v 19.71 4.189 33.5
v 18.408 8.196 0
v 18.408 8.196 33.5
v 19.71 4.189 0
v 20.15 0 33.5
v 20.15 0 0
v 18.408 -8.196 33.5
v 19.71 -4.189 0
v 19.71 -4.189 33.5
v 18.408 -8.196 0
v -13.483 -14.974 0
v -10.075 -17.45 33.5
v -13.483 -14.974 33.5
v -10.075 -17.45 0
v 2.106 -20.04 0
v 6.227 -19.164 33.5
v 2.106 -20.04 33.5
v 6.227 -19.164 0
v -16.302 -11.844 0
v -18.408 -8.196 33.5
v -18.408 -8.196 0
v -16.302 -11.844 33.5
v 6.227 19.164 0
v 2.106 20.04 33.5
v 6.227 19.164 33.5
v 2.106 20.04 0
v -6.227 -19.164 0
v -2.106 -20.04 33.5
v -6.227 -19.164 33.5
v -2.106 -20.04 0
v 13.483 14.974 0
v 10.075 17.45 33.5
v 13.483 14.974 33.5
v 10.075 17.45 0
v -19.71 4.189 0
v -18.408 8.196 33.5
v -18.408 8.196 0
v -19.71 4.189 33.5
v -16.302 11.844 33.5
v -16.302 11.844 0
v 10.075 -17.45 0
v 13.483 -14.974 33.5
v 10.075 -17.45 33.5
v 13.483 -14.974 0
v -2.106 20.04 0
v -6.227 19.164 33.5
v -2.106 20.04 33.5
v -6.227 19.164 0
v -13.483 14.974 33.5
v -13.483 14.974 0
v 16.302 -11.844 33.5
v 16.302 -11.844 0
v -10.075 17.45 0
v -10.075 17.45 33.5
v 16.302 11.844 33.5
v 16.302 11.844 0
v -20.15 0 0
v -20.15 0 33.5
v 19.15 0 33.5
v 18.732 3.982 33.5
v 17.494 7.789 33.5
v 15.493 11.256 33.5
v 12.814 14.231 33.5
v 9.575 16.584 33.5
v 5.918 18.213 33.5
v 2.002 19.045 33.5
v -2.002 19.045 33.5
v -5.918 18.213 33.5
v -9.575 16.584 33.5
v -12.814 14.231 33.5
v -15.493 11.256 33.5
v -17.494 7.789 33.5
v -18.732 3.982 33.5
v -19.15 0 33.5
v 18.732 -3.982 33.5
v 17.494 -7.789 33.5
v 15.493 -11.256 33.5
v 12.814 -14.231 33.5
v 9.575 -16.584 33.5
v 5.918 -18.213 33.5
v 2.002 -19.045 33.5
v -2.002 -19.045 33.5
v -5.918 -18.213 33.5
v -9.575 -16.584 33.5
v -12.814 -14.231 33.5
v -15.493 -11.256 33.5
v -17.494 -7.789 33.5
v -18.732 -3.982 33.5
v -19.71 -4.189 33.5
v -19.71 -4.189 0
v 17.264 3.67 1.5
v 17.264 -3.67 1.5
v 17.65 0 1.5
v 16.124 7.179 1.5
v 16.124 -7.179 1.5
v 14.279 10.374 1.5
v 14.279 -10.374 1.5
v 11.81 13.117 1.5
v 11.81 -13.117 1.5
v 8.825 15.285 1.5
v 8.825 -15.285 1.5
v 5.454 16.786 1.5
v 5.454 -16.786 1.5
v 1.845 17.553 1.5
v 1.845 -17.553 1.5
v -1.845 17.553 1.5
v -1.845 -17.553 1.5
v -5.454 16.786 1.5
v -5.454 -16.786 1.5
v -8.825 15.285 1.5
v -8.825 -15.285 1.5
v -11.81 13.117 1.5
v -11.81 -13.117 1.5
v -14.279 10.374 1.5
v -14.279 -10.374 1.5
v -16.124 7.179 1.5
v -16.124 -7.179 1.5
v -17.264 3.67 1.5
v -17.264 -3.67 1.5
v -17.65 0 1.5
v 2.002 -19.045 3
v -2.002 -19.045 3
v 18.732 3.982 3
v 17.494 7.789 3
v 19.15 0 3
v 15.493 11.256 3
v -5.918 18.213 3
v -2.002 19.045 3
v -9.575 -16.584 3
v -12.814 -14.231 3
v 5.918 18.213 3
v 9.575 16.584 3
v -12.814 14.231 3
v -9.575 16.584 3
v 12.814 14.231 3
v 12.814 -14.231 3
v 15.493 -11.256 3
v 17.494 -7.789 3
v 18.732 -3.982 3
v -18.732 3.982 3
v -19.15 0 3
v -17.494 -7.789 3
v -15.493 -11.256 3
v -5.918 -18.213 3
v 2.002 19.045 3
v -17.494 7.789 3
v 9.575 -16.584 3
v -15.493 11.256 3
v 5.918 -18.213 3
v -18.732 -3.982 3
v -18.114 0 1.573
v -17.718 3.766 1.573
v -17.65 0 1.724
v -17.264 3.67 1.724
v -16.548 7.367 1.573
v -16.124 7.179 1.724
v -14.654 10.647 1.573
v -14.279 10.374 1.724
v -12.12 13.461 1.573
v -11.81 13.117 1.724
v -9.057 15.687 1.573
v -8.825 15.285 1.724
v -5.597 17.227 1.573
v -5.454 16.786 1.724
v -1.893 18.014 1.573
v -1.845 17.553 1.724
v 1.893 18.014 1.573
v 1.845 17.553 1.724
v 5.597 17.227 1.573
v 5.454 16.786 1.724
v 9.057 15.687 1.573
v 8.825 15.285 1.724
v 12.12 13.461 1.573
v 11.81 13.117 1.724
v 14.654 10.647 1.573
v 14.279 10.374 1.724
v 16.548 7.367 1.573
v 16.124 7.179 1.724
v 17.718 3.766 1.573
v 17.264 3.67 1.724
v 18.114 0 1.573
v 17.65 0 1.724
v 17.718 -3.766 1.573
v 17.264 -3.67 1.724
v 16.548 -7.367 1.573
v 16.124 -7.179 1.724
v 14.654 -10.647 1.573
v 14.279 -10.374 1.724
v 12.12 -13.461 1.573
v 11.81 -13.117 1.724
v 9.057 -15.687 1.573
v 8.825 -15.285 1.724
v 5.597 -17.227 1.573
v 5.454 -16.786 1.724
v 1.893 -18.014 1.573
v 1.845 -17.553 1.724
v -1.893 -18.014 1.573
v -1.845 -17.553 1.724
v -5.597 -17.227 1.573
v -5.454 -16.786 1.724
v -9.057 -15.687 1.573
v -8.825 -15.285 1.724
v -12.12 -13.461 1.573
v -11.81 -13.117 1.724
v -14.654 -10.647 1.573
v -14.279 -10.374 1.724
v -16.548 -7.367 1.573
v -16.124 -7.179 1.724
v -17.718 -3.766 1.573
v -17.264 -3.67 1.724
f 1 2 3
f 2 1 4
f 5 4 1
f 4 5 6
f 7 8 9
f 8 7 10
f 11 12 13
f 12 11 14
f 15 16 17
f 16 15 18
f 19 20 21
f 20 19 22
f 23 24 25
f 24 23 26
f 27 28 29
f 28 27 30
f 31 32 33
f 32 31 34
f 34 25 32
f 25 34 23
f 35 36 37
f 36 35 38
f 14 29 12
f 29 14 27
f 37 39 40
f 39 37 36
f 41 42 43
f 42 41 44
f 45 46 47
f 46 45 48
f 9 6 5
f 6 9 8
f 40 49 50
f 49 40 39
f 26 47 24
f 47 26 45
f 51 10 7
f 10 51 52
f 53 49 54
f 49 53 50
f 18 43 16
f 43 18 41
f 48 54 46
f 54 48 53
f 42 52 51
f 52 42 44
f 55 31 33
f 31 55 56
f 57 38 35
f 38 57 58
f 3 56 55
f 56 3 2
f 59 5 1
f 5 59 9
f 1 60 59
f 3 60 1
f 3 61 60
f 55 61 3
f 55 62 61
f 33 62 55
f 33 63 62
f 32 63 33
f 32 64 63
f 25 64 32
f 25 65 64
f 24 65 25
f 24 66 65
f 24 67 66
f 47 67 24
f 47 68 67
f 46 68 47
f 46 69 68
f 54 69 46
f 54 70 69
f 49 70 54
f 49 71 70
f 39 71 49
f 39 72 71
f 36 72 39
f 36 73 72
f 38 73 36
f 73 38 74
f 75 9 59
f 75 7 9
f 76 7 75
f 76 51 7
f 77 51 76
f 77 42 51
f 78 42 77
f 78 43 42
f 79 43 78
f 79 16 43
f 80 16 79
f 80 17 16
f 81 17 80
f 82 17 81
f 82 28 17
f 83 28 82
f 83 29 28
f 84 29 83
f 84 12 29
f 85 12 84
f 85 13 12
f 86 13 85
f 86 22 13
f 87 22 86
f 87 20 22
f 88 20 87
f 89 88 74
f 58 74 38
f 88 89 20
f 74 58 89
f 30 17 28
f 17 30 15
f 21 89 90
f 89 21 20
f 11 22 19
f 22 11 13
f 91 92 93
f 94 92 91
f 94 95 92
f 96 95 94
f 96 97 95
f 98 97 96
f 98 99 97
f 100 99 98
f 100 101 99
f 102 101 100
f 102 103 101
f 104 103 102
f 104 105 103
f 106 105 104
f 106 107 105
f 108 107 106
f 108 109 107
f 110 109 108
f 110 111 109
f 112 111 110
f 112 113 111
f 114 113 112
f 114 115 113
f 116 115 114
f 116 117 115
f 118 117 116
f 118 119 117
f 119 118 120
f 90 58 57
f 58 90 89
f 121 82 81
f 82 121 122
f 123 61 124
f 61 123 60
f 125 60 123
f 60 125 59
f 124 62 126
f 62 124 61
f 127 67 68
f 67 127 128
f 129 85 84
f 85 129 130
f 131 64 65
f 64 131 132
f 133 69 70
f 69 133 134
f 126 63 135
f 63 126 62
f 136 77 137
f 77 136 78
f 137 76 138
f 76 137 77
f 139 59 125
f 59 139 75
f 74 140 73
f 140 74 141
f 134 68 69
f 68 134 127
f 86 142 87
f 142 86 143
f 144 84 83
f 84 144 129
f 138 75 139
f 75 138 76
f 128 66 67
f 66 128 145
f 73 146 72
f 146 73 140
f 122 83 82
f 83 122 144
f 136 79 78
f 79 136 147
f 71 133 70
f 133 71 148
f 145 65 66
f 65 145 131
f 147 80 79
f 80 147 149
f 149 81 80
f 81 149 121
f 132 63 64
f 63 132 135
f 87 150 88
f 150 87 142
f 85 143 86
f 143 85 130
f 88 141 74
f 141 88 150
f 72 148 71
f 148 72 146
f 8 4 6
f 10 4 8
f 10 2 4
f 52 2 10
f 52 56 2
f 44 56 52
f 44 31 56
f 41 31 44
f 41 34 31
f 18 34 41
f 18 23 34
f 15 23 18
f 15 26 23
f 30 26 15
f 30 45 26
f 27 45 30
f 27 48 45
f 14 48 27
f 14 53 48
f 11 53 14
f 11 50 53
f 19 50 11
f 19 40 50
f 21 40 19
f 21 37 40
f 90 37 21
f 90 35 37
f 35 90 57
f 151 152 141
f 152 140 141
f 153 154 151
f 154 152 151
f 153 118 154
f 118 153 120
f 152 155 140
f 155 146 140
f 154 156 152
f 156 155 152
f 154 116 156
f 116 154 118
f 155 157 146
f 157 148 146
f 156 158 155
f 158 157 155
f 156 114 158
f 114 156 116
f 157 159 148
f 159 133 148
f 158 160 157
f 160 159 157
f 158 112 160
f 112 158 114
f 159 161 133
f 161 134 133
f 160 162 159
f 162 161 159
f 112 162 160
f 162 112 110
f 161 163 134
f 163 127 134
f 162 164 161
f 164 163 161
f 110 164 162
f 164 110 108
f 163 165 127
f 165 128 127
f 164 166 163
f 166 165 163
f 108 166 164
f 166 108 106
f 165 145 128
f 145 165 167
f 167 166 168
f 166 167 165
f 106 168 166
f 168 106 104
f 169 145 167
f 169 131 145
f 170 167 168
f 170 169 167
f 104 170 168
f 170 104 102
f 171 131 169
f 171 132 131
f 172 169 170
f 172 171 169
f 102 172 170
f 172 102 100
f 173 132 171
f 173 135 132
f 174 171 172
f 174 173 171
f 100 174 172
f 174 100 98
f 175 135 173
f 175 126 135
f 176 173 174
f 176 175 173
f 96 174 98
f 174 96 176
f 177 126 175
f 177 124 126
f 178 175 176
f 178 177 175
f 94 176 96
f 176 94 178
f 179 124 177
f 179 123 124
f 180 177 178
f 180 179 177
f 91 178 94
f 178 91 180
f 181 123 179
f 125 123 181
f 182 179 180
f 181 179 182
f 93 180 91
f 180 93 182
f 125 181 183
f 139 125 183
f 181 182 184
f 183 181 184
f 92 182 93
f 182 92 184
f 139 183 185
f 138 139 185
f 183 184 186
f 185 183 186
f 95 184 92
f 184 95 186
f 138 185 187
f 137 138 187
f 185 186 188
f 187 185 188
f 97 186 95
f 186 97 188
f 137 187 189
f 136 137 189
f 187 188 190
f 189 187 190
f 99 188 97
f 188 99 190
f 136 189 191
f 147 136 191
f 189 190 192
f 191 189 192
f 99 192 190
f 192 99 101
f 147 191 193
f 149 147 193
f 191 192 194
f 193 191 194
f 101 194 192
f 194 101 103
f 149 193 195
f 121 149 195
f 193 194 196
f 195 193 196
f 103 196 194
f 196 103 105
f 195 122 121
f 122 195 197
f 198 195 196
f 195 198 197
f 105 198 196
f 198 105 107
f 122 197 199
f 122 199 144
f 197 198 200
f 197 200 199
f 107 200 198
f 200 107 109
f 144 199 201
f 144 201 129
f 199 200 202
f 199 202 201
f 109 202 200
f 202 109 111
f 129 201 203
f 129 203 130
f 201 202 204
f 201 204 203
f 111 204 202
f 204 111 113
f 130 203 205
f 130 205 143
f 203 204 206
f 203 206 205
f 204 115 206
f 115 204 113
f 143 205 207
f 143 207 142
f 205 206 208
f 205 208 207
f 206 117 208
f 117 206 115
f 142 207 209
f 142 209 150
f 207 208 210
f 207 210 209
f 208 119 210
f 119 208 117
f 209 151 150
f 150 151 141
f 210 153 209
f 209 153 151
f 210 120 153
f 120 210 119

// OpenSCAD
// file: ../../modules/lid.scad
module lid(
  hole_diameter,
  edge_height,
  inner_border = 0,
  base_height = 1,
  edge_thickness = 1
) {
  inner_radius = hole_diameter / 2;
  outer_radius = inner_radius + edge_thickness;

  cylinder(h = base_height, r = outer_radius);

  translate([ 0, 0, base_height ]) difference() {
    cylinder(h = edge_height, r = outer_radius);
    cylinder(h = edge_height + .01, r = hole_diameter / 2);
  }

  rotate_extrude() translate([inner_radius - inner_border, base_height]) difference() {
    square([inner_border, inner_border]);
    translate([0, inner_border]) circle(r = inner_border);
  }
}
// main file
use <../../modules/lid.scad>

lid(
  hole_diameter = 38.3,
  edge_height = 32,
  inner_border = 1.5,
  base_height = 1.5,
  edge_thickness = 1
);
